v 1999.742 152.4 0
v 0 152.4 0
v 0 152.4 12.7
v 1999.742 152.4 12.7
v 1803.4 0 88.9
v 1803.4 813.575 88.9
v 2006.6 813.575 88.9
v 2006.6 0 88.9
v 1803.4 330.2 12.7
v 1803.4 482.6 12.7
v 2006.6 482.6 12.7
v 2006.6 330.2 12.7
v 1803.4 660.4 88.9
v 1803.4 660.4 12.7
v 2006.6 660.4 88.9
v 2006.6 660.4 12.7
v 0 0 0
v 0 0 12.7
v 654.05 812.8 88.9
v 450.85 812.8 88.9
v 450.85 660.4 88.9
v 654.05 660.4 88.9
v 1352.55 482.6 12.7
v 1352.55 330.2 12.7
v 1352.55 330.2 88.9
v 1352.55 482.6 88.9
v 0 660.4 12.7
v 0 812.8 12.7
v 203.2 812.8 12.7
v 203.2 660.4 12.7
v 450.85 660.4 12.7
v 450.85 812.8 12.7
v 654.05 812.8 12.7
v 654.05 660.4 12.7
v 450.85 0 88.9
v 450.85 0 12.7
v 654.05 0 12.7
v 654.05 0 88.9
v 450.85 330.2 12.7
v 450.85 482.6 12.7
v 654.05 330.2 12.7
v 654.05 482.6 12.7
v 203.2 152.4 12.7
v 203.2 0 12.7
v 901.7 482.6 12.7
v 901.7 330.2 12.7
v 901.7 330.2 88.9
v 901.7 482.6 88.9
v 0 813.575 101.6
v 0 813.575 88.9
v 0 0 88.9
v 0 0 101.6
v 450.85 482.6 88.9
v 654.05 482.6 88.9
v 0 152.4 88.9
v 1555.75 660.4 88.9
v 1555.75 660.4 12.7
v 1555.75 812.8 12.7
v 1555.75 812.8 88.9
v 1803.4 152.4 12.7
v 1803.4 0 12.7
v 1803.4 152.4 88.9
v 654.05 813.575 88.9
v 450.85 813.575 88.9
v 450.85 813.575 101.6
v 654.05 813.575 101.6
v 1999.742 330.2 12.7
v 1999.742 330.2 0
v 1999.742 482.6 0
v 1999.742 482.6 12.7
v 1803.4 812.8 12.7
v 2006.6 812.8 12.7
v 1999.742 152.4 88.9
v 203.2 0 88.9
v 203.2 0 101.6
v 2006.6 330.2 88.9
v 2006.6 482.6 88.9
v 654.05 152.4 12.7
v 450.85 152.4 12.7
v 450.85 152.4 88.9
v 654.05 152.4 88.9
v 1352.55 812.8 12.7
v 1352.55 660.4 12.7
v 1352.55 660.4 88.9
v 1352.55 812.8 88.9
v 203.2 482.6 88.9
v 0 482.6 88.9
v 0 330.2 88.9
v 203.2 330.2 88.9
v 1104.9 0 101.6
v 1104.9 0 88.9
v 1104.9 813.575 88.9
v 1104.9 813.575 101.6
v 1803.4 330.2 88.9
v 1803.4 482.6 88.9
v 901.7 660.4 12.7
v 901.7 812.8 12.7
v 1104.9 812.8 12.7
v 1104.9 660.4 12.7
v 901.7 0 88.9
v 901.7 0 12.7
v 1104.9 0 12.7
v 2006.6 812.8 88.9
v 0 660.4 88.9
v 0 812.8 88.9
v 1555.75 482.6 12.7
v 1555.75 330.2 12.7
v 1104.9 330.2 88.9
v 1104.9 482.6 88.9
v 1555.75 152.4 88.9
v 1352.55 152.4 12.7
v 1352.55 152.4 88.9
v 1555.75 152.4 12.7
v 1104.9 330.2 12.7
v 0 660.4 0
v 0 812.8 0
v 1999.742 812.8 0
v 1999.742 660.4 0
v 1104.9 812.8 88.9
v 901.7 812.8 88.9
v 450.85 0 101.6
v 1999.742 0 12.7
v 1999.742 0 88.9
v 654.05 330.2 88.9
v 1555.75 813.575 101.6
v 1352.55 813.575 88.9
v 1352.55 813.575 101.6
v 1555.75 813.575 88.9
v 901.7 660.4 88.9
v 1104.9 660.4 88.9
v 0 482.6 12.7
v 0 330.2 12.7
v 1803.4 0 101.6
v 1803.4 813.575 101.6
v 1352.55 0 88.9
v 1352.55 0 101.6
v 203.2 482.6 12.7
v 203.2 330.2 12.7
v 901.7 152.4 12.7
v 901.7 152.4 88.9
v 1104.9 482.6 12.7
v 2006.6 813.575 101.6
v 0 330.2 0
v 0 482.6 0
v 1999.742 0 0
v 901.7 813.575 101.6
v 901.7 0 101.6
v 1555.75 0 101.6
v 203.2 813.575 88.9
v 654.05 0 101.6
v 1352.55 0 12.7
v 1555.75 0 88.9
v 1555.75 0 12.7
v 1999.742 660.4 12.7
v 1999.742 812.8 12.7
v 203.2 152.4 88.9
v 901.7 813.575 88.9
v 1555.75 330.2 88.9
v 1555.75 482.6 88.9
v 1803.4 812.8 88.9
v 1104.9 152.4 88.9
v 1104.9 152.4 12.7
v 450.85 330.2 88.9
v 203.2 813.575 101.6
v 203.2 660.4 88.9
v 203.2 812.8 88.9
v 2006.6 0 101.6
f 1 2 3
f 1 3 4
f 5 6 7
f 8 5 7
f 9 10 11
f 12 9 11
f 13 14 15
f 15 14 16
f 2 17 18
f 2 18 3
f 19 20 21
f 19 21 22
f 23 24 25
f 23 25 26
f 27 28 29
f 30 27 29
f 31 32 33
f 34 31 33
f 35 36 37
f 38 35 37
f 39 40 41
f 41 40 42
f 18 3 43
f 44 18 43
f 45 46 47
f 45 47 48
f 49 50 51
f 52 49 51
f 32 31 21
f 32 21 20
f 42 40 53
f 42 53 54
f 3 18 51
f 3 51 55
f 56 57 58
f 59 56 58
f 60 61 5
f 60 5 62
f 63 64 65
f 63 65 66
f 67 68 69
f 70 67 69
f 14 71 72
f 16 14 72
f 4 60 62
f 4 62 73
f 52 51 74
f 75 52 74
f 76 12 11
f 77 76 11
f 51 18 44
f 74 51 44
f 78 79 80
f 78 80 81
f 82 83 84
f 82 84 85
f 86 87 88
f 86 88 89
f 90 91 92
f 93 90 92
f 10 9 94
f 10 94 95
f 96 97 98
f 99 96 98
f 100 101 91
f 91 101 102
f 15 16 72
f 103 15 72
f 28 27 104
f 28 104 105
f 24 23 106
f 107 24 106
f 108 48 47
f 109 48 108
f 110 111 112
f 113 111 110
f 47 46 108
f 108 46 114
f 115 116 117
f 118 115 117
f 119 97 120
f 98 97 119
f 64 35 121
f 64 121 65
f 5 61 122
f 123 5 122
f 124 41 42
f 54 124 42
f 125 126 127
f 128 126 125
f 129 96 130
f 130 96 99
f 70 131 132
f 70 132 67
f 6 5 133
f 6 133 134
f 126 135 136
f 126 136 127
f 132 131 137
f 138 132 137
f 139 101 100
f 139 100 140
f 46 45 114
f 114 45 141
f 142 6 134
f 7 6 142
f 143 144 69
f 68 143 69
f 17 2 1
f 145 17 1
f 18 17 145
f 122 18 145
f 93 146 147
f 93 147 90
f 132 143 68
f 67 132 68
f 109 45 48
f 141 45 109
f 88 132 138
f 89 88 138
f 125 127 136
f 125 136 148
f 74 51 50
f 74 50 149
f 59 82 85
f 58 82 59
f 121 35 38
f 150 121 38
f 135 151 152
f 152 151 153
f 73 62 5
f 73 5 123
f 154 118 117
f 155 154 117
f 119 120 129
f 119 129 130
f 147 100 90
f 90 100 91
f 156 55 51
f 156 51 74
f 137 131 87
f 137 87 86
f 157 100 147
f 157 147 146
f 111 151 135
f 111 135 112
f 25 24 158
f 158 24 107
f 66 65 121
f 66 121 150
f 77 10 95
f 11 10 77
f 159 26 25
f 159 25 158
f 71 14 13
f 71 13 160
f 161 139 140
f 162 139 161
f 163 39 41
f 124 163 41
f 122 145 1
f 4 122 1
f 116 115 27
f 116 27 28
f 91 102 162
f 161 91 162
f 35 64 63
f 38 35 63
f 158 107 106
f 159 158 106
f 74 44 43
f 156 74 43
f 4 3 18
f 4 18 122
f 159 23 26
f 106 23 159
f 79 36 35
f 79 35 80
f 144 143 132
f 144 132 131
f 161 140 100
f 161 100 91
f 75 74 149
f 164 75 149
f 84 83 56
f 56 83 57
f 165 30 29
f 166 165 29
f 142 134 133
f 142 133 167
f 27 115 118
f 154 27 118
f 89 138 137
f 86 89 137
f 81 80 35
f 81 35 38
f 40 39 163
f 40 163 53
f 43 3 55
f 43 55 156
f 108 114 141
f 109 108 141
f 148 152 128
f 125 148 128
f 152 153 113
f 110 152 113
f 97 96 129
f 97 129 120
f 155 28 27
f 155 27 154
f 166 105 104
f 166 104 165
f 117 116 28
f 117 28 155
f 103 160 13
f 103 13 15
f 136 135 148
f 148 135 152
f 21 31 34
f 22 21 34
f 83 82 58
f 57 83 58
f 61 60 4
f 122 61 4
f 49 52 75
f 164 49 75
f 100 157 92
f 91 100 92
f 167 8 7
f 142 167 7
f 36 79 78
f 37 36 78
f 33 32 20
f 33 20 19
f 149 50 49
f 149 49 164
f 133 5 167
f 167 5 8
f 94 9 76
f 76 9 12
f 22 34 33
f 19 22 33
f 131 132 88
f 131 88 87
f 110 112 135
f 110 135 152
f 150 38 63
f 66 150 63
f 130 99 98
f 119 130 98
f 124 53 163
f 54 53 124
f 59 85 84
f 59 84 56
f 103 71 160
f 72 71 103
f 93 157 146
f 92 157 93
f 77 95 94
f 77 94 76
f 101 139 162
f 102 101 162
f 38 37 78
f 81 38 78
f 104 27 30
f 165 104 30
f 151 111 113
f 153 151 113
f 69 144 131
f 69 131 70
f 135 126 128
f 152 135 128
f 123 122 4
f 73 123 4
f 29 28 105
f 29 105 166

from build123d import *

# Parameters (mm, degrees)
F0_W     = 1999.742
F0_H     = 152.4
F1_DEPTH = 12.7
F2_W     = 203.2
F2_H     = 152.4
F2_W_2   = 196.342
F3_DEPTH = 76.2
F4_W     = 203.2
F4_H     = 152.4
F4_H_2   = 661.175327
F4_H_3   = 813.575327
F5_DEPTH = 12.7


with BuildPart() as f1:
    # F0 (on Top) → F1 (new body)
    with BuildSketch(Plane.XY):
        with Locations((999.871, 76.2)):
            Rectangle(F0_W, F0_H)
        with Locations((999.871, 406.4)):
            Rectangle(F0_W, F0_H)
        with Locations((999.871, 736.6)):
            Rectangle(F0_W, F0_H)
    extrude(amount=F1_DEPTH)


with BuildPart() as f3:
    # F2 (on face) → F3 (new body)
    with BuildSketch(Plane.XY.offset(12.7)):
        with Locations((101.6, 76.2)):
            Rectangle(F2_W, F2_H)
        with Locations((552.45, 76.2)):
            Rectangle(F2_W, F2_H)
        with Locations((1003.3, 76.2)):
            Rectangle(F2_W, F2_H)
        with Locations((1454.15, 76.2)):
            Rectangle(F2_W, F2_H)
        with Locations((1901.571, 76.2)):
            Rectangle(F2_W_2, F2_H)
        with Locations((1905, 406.4)):
            Rectangle(F2_W, F2_H)
        with Locations((1454.15, 406.4)):
            Rectangle(F2_W, F2_H)
        with Locations((1003.3, 406.4)):
            Rectangle(F2_W, F2_H)
        with Locations((552.45, 406.4)):
            Rectangle(F2_W, F2_H)
        with Locations((101.6, 406.4)):
            Rectangle(F2_W, F2_H)
        with Locations((101.6, 736.6)):
            Rectangle(F2_W, F2_H)
        with Locations((552.45, 736.6)):
            Rectangle(F2_W, F2_H)
        with Locations((1003.3, 736.6)):
            Rectangle(F2_W, F2_H)
        with Locations((1454.15, 736.6)):
            Rectangle(F2_W, F2_H)
        with Locations((1905, 736.6)):
            Rectangle(F2_W, F2_H)
    extrude(amount=F3_DEPTH)


with BuildPart() as f5:
    # F4 (on face) → F5 (new body)
    with BuildSketch(Plane.XY.offset(88.9)):
        with Locations((101.6, 76.2)):
            Rectangle(F4_W, F4_H)
        with Locations((101.6, 482.987663)):
            Rectangle(F4_W, F4_H_2)
        with Locations((552.45, 406.787664)):
            Rectangle(F4_W, F4_H_3)
        with Locations((1003.3, 406.787664)):
            Rectangle(F4_W, F4_H_3)
        with Locations((1454.15, 406.787664)):
            Rectangle(F4_W, F4_H_3)
        with Locations((1905, 406.787664)):
            Rectangle(F4_W, F4_H_3)
    extrude(amount=F5_DEPTH)


solid = Compound([f1.part, f3.part, f5.part])
